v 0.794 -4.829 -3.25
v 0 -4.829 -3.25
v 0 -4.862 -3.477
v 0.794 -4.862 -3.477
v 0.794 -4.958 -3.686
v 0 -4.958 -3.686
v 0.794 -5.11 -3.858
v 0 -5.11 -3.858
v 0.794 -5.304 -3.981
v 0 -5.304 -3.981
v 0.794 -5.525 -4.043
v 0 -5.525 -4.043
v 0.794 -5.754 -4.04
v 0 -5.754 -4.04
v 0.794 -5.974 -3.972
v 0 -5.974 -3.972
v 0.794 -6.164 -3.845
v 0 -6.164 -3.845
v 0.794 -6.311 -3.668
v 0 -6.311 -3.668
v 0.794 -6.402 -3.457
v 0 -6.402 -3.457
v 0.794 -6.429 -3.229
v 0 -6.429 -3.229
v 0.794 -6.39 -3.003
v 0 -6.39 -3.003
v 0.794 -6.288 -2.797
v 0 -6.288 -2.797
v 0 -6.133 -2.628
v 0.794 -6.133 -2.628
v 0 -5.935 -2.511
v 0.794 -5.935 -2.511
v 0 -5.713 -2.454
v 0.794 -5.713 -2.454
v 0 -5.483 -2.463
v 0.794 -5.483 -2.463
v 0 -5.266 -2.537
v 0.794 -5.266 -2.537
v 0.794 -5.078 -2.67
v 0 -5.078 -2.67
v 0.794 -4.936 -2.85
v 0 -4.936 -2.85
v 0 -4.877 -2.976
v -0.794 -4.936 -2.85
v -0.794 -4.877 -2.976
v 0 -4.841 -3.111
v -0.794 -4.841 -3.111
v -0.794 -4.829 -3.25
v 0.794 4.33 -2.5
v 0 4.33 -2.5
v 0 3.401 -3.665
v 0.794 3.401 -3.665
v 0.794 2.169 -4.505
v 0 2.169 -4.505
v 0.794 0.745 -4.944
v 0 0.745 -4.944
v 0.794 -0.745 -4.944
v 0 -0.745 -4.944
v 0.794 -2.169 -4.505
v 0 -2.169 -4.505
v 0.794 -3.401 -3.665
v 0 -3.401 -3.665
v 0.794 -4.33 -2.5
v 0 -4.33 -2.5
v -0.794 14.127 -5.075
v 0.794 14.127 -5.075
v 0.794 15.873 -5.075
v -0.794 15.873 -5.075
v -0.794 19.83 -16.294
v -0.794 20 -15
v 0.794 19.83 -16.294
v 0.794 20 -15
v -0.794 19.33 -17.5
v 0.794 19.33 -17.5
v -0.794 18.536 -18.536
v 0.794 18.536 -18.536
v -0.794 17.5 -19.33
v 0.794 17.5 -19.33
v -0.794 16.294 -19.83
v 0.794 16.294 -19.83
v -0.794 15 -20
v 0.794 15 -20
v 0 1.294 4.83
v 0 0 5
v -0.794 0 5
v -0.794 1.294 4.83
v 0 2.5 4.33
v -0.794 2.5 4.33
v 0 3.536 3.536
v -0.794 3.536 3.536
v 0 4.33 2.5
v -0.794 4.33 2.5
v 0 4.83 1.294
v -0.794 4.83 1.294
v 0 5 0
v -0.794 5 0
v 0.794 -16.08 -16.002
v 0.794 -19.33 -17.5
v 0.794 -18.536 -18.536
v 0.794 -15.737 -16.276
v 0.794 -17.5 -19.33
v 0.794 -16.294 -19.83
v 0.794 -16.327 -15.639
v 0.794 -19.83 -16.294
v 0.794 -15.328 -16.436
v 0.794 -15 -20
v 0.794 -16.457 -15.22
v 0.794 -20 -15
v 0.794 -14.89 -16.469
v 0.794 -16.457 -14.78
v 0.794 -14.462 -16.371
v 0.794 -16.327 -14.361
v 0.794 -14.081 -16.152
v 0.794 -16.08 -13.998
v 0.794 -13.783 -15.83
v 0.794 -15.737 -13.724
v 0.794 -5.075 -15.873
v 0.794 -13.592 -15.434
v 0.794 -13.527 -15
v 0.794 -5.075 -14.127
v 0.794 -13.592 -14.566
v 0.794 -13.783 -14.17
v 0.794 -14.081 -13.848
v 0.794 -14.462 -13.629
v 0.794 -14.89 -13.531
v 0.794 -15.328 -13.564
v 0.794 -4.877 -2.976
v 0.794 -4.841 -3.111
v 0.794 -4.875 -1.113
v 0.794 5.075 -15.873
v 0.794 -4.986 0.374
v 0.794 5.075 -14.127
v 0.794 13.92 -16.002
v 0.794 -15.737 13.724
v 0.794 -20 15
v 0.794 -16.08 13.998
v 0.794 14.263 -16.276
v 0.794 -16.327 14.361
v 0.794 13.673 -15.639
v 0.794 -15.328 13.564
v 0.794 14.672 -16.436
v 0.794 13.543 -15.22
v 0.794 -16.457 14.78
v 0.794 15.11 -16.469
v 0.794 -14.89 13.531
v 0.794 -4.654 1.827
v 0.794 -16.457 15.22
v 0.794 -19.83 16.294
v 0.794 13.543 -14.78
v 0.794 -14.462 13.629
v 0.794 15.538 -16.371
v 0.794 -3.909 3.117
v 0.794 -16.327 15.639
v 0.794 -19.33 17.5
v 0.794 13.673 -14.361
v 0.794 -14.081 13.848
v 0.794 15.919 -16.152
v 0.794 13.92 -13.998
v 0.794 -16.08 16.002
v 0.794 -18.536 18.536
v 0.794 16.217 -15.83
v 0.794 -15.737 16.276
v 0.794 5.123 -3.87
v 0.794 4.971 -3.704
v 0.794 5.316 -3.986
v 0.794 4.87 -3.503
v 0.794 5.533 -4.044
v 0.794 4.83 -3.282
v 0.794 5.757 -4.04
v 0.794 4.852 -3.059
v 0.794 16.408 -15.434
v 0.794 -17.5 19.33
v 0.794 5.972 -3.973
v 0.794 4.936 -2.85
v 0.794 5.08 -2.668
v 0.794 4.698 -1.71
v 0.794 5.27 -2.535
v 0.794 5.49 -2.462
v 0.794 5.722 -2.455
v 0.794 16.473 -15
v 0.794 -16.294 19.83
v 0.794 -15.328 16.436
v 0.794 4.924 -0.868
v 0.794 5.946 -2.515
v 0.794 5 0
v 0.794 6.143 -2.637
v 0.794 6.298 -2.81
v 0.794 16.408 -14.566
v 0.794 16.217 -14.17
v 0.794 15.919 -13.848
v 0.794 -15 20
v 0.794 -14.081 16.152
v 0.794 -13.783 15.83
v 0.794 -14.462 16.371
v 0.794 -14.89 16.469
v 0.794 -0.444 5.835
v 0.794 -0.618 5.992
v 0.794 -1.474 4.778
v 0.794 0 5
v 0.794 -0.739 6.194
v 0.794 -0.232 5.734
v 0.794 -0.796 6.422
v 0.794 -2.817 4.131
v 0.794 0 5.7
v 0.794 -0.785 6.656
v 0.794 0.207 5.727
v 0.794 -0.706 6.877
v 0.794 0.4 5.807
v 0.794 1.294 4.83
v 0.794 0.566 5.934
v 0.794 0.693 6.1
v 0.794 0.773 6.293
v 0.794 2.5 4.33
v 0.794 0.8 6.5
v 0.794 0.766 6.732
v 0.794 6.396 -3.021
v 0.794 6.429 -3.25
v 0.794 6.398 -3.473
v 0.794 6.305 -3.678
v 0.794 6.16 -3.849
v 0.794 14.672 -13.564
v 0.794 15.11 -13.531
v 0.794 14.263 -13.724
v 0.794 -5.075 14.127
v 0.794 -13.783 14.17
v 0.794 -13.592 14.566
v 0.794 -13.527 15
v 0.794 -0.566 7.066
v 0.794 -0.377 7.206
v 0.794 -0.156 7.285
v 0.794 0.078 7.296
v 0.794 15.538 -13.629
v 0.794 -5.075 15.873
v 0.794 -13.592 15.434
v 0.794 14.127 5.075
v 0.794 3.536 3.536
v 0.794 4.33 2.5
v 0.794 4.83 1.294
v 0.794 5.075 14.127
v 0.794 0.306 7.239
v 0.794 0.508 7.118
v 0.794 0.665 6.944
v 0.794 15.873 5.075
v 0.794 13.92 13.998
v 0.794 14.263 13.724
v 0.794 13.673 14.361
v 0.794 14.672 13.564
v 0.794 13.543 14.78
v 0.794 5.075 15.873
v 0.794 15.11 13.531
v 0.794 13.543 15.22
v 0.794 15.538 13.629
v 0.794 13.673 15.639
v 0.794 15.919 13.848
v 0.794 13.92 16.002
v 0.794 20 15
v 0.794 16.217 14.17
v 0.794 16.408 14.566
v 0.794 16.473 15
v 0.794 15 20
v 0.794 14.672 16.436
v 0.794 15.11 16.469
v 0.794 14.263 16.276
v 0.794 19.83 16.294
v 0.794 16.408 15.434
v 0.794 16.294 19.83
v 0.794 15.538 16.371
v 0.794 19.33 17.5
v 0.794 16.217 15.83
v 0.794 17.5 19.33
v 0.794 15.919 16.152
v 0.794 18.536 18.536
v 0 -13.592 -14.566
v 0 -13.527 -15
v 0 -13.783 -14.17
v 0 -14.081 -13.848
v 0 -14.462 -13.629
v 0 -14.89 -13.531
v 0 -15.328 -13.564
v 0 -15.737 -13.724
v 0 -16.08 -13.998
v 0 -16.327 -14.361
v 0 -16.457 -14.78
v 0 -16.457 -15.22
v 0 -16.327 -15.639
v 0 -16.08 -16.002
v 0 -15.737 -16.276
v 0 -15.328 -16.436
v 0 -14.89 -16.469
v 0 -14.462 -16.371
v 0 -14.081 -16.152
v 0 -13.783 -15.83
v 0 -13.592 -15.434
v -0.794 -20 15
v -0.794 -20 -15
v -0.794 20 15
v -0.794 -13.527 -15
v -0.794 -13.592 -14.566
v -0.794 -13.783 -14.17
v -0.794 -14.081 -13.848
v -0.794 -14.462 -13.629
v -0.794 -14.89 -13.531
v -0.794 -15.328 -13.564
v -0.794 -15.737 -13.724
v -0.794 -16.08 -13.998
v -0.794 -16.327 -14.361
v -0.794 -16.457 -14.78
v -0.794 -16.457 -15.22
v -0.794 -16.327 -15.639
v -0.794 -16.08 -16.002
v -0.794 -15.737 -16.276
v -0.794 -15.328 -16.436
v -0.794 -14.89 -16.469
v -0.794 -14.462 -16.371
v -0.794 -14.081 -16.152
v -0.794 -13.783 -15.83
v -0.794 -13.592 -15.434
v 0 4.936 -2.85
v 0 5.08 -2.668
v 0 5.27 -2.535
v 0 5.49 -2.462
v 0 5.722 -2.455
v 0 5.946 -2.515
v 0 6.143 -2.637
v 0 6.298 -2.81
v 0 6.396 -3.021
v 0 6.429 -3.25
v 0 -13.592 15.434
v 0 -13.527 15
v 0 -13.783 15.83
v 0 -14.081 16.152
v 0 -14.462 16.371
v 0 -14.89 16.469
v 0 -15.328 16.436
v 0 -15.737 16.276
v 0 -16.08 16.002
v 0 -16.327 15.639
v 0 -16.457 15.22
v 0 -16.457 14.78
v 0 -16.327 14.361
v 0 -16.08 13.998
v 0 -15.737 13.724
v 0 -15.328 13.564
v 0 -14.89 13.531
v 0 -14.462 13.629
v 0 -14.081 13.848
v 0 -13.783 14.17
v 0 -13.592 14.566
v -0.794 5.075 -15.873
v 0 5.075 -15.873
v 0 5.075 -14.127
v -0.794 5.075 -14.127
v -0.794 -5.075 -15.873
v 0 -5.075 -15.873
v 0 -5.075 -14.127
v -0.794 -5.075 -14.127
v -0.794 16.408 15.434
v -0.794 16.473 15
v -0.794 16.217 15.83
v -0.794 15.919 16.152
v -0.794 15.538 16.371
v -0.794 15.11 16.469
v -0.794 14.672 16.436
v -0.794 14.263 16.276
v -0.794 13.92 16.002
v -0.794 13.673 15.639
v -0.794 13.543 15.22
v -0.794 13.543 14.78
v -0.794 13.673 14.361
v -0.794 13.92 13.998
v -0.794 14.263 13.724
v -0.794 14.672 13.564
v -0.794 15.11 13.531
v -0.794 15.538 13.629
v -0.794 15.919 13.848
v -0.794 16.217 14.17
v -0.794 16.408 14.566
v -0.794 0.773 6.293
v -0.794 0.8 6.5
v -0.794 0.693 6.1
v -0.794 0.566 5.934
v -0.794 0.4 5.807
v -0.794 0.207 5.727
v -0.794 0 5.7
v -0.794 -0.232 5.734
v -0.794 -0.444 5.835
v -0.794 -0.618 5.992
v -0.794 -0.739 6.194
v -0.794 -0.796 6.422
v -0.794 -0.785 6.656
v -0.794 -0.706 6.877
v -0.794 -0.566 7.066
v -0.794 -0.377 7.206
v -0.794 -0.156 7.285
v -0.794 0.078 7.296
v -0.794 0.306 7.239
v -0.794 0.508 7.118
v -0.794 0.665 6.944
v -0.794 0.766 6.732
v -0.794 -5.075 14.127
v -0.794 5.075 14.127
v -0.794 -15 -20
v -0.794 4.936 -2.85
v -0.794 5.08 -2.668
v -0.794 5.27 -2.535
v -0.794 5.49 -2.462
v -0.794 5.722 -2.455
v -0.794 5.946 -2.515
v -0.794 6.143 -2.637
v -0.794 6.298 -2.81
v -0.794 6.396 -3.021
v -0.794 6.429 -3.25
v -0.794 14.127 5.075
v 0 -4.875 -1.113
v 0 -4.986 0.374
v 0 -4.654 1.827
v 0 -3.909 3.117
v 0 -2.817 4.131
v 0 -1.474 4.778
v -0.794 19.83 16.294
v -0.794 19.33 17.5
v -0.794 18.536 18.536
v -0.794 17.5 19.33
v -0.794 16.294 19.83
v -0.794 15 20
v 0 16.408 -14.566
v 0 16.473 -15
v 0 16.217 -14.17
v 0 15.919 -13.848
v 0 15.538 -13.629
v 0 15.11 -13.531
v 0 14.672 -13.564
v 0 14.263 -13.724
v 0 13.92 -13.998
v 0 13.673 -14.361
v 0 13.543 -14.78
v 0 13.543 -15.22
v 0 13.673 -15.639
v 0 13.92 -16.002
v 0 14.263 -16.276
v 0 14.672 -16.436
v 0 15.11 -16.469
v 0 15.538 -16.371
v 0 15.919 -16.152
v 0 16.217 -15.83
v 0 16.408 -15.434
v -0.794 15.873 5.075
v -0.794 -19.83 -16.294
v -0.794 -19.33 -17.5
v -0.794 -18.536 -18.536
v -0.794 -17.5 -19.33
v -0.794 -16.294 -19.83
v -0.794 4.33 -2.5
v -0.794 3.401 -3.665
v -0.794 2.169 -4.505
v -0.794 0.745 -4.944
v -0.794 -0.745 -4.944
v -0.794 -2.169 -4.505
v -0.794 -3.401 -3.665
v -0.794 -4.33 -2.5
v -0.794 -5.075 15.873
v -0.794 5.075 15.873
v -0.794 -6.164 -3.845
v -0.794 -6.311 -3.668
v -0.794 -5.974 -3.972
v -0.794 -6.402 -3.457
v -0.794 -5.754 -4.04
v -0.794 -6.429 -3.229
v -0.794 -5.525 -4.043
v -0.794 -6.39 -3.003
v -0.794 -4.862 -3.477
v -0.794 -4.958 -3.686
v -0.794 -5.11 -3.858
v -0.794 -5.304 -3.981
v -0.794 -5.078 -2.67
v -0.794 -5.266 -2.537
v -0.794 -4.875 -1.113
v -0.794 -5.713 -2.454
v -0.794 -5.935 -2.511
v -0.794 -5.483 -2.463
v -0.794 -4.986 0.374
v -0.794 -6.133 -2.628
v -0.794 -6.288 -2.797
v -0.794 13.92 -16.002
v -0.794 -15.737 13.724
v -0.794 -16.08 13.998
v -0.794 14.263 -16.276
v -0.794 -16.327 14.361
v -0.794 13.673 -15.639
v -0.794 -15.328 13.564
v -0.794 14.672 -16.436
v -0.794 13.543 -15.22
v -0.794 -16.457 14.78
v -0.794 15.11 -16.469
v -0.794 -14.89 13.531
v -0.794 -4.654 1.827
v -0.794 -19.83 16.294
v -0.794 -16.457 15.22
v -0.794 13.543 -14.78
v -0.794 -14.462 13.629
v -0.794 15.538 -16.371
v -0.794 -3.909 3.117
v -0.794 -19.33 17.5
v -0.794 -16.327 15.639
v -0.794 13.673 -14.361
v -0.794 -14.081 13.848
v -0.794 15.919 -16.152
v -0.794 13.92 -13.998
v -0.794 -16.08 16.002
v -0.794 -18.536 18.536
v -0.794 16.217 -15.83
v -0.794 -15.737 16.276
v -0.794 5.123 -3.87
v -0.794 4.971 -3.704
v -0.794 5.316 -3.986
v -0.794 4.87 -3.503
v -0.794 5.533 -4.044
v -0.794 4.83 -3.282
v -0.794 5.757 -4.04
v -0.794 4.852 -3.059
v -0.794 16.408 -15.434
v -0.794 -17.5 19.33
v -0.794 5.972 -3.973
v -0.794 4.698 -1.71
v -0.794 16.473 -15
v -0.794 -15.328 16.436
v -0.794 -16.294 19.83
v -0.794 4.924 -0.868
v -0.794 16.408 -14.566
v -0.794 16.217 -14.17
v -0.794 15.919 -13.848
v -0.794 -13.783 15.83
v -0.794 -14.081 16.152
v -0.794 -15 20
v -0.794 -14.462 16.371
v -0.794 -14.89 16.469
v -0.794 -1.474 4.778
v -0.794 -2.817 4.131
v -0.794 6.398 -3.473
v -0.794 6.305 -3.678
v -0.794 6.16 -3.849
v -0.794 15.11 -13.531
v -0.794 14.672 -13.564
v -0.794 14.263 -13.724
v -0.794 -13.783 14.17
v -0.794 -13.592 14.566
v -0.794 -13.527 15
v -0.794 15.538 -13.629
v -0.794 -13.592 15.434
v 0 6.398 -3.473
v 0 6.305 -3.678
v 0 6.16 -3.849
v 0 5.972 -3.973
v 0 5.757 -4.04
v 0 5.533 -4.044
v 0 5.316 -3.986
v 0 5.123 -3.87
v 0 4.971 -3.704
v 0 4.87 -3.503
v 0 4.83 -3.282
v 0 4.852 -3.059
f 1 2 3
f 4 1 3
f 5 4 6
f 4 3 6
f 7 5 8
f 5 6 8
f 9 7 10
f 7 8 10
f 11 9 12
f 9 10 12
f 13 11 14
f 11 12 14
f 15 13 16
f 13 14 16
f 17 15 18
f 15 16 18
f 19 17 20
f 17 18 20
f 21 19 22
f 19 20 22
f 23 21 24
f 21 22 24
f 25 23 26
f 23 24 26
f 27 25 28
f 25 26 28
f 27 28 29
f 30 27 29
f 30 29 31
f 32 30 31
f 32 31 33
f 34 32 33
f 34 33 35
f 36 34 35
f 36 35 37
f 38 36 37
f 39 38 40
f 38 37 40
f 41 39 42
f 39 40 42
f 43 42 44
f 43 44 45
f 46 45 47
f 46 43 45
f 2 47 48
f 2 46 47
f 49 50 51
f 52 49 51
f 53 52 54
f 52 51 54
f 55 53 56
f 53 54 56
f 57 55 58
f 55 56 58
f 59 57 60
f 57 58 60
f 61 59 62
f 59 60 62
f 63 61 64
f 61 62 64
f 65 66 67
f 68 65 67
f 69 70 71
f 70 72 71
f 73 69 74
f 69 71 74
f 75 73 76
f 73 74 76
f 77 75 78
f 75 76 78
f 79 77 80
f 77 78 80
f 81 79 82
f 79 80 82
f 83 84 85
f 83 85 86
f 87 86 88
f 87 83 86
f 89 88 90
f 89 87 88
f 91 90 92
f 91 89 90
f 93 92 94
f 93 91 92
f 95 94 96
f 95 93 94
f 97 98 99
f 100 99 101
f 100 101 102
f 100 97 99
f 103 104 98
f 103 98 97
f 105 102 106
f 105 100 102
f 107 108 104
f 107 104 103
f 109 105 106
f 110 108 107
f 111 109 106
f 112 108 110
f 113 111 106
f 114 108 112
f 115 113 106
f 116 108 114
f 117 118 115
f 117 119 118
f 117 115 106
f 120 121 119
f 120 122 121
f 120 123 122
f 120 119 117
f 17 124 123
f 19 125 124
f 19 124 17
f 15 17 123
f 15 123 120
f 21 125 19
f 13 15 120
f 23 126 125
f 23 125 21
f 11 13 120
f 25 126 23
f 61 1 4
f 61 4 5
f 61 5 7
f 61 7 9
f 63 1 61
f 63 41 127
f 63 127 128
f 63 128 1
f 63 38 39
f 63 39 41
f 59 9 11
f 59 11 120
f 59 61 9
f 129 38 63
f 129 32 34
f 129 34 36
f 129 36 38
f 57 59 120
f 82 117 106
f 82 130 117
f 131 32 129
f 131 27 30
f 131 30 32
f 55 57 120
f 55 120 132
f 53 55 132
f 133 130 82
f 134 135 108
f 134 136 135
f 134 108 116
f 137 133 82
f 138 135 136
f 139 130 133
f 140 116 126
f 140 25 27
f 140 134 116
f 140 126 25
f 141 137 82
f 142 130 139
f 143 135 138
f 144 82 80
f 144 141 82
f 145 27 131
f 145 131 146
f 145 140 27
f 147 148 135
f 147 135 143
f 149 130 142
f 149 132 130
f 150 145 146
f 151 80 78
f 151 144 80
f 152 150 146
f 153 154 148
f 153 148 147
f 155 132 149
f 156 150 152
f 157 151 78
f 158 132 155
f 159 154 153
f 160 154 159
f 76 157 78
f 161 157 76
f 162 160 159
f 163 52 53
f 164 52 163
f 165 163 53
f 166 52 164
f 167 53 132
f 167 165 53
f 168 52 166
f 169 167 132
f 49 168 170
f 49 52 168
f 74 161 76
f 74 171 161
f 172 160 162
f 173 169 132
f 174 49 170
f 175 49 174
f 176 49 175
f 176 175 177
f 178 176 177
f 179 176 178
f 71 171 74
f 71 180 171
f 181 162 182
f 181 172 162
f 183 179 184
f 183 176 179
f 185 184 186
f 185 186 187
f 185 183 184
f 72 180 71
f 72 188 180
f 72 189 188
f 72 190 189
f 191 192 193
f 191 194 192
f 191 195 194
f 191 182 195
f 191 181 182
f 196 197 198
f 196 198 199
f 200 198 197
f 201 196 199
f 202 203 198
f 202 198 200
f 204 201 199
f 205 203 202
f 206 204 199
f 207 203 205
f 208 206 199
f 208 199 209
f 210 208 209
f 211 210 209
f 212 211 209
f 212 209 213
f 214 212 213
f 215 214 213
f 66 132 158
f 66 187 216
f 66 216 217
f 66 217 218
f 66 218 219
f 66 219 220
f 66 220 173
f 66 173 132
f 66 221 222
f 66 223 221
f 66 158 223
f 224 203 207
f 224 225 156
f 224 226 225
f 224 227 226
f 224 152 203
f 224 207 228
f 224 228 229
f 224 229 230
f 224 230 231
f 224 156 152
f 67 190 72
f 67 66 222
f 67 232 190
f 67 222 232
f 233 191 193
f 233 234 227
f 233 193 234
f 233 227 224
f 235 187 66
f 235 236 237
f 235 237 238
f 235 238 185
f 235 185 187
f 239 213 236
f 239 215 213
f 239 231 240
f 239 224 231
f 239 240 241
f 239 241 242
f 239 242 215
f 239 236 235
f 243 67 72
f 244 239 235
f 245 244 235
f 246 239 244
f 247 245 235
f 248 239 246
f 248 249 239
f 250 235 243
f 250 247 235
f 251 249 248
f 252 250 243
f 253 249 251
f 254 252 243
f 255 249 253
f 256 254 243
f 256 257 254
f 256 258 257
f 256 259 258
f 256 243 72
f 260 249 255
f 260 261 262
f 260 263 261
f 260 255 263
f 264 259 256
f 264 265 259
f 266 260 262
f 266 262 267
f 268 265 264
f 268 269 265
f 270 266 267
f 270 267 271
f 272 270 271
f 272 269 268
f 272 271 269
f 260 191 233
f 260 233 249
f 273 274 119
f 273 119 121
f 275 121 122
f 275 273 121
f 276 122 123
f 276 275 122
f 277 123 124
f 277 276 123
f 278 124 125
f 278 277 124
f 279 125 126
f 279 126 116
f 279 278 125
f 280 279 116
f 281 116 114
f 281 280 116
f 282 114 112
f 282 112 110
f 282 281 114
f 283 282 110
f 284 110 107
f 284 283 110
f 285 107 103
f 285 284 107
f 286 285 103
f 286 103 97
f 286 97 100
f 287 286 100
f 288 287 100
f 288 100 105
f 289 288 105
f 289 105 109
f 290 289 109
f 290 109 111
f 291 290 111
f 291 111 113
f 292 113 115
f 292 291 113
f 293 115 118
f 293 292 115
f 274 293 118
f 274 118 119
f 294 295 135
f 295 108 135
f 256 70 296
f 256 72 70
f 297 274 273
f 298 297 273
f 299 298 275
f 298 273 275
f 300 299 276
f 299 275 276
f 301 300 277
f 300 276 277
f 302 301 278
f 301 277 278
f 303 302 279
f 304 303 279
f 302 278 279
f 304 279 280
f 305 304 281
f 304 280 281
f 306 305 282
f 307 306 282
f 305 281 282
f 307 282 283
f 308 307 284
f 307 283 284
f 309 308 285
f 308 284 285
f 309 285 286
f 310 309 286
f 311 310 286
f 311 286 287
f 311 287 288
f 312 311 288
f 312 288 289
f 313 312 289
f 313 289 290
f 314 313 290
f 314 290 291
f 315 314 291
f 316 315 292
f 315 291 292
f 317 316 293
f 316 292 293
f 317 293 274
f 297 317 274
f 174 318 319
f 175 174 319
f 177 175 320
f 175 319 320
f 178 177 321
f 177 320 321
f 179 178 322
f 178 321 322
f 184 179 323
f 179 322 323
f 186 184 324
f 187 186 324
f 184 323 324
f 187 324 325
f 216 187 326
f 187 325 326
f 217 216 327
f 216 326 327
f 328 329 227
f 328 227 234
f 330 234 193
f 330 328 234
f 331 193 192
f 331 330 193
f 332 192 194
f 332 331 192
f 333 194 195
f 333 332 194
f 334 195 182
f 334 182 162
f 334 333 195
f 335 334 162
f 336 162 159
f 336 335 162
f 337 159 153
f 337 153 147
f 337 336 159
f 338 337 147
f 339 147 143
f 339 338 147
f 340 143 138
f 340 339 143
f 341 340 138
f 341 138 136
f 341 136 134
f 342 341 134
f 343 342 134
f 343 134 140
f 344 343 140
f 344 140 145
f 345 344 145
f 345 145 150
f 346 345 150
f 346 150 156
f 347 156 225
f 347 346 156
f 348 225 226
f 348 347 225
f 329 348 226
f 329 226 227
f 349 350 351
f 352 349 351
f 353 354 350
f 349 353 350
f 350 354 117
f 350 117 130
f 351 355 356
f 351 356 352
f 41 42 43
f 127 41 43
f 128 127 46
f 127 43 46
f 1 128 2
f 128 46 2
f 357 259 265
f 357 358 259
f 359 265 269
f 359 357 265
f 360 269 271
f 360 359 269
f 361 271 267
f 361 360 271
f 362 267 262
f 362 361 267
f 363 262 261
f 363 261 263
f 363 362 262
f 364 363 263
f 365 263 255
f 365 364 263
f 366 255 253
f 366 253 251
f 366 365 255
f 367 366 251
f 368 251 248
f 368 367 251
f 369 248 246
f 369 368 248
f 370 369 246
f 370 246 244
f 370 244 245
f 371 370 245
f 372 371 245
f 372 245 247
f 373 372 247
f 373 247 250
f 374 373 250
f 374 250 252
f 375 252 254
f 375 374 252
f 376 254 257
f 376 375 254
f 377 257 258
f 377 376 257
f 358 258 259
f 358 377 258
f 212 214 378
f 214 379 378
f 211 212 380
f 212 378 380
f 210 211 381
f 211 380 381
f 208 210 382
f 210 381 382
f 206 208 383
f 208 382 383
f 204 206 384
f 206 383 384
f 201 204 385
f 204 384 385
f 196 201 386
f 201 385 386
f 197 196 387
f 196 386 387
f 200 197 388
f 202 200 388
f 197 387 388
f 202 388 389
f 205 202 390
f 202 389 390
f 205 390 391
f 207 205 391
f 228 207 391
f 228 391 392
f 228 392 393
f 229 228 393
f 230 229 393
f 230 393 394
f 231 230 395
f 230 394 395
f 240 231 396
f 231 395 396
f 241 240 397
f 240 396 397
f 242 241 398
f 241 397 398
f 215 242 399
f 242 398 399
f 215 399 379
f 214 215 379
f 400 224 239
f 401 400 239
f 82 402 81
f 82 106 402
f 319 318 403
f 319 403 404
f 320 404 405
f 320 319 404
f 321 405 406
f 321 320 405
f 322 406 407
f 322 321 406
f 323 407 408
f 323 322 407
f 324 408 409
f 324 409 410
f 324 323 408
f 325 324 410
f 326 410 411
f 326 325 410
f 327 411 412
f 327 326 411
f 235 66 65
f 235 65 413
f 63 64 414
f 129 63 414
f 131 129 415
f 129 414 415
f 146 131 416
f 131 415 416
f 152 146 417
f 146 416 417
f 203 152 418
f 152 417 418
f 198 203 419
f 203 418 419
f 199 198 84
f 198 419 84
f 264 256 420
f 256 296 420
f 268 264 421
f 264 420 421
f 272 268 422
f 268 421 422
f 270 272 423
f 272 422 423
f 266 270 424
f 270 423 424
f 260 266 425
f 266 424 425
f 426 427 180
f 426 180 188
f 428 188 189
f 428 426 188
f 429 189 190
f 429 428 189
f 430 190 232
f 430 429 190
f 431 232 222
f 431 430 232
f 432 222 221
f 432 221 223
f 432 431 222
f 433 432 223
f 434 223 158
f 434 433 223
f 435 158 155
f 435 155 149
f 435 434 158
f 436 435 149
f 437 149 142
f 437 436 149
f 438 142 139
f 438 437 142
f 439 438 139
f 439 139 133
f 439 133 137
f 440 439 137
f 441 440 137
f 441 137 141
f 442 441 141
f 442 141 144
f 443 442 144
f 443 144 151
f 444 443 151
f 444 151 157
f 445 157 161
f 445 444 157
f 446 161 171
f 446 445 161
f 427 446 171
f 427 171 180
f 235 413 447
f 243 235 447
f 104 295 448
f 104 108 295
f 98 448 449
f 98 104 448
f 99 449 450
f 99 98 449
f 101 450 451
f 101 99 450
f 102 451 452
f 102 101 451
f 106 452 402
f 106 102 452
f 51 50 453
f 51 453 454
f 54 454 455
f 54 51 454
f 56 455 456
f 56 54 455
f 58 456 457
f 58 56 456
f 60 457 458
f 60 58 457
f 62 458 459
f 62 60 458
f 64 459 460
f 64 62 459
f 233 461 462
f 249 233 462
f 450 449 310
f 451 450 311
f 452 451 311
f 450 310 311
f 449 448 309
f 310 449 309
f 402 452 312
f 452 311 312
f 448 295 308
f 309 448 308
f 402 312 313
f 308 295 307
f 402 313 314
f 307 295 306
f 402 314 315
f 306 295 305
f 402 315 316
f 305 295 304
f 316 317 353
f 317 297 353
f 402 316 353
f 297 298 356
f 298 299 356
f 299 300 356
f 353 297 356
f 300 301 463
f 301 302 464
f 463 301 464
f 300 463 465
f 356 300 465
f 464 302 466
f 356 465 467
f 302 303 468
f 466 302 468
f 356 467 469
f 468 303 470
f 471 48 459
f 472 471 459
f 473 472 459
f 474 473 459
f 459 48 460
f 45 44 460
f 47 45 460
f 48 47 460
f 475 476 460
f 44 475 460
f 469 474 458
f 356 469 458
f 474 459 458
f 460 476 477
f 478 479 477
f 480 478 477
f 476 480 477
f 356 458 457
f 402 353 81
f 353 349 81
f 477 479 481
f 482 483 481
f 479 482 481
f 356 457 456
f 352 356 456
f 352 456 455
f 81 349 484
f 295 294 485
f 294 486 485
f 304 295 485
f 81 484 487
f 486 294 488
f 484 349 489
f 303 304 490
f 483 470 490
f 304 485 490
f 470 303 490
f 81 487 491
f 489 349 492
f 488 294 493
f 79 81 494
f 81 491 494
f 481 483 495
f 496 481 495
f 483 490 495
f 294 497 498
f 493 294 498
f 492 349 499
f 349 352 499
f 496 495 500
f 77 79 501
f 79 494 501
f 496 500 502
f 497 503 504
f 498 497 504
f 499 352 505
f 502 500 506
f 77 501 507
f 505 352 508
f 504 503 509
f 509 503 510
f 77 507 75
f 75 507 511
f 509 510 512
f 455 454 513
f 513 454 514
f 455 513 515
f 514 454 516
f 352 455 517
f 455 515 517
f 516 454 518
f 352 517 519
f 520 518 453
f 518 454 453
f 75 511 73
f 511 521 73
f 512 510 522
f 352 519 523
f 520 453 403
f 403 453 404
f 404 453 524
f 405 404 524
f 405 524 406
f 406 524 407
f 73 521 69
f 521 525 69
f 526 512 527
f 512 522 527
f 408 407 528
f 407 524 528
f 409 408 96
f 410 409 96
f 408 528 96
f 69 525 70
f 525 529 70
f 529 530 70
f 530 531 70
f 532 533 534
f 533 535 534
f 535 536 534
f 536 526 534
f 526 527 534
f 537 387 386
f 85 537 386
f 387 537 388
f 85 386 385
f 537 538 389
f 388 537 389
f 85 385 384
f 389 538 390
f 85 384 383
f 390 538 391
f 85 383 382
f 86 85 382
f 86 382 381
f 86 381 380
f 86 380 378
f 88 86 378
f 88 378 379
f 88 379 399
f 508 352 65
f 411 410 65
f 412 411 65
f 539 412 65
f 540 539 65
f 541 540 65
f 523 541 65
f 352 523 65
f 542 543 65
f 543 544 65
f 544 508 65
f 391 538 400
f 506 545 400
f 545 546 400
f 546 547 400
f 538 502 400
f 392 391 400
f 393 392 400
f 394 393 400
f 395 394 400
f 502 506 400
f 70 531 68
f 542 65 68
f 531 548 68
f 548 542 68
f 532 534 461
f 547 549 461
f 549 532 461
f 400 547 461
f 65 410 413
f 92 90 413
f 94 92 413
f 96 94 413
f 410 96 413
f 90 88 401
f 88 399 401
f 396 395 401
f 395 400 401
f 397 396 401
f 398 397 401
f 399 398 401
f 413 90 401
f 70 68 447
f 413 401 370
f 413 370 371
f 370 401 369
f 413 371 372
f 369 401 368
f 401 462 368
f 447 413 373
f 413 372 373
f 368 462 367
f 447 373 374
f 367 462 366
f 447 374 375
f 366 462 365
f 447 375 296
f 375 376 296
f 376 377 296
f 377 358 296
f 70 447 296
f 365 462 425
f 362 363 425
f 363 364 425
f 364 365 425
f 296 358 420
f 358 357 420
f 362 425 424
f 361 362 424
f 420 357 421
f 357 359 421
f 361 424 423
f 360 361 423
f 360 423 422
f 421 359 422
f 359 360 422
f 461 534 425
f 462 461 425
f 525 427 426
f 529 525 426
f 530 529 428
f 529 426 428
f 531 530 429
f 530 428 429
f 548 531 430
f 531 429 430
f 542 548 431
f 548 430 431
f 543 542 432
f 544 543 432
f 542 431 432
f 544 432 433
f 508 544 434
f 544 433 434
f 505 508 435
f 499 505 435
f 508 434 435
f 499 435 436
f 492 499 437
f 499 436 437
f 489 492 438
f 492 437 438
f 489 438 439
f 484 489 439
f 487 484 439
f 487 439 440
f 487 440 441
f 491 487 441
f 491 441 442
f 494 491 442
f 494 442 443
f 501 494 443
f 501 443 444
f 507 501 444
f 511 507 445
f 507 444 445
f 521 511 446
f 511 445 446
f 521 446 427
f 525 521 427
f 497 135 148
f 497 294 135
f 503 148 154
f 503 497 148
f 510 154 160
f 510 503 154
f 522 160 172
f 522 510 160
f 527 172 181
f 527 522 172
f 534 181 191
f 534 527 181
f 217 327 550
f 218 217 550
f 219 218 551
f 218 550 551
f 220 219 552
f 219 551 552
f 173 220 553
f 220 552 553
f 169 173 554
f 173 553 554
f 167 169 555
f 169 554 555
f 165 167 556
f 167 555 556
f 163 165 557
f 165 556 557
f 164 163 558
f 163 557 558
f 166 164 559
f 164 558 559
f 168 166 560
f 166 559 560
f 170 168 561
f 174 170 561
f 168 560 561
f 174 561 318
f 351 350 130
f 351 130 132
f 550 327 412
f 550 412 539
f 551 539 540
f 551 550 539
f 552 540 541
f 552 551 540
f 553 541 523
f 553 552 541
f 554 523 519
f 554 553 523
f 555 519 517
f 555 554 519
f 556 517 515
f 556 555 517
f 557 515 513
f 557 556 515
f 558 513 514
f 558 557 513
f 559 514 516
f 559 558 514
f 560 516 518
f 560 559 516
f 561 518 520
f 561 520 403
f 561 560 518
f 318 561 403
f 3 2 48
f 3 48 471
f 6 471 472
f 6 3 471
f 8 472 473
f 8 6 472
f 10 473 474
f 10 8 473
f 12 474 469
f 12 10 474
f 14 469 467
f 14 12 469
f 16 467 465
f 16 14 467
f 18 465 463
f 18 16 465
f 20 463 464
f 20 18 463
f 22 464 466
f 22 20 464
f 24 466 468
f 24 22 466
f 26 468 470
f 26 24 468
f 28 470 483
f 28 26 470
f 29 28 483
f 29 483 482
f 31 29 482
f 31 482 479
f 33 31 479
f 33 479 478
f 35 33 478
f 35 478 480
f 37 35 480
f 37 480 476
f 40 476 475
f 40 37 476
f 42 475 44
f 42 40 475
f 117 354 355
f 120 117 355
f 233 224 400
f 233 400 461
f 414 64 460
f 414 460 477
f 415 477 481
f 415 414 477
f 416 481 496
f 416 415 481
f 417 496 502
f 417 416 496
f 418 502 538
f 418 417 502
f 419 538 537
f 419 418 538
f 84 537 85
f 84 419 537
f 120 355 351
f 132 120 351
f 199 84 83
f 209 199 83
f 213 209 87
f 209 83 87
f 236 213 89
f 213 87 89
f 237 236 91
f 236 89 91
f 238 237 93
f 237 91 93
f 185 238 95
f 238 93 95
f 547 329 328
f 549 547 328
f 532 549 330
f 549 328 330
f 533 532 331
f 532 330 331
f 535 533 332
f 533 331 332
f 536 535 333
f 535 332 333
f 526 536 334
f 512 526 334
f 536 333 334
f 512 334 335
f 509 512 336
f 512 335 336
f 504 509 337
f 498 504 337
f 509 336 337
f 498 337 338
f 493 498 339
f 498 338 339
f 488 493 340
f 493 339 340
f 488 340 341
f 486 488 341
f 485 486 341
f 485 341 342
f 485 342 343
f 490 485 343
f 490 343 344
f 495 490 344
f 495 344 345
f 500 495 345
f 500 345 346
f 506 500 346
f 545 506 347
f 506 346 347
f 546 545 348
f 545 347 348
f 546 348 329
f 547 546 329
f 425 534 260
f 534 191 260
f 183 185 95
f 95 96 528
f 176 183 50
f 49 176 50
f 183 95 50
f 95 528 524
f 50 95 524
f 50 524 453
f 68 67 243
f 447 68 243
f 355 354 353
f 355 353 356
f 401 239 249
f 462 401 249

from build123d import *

# Parameters (mm, degrees)
F0_W     = 40
F0_H     = 40
F0_R     = 1.4732
F0_W_2   = 10.15
F0_H_2   = 1.74625
F0_W_3   = 1.74625
F0_H_3   = 10.15
F1_DEPTH = 0.79375
F2_R     = 5


# Not quite as in the source:
# - a length typed as a fraction of an inch, garbled in the dataset ("3 / 203.2 mm" for 3/8 in), is restored


with BuildPart() as f1:
    # F0 (on Right) → F1 (new body, symmetric)
    with BuildSketch(Plane.YZ):
        Rectangle(F0_W, F0_H)
        with Locations((-15, -15)):
            Circle(F0_R, mode=Mode.SUBTRACT)
        with BuildLine():
            ThreePointArc((-4.8291651246, -3.25), (-6.4019057856, -3.4570552361), (-4.9363448016, -2.85))
            ThreePointArc((-4.9363448016, -2.85), (-4.8564244636, -3.0429447639), (-4.8291651246, -3.25))
        make_face(mode=Mode.SUBTRACT)
        with Locations((0, -15)):
            Rectangle(F0_W_2, F0_H_2, mode=Mode.SUBTRACT)
        with Locations((15, -15)):
            Circle(F0_R, mode=Mode.SUBTRACT)
        with BuildLine():
            ThreePointArc((6.4291651246, -3.25), (5.4221098885, -4.022740661), (4.9363448016, -2.85))
            ThreePointArc((4.9363448016, -2.85), (5.8362203607, -2.477259339), (6.4291651246, -3.25))
        make_face(mode=Mode.SUBTRACT)
        with Locations((-15, 15)):
            Circle(F0_R, mode=Mode.SUBTRACT)
        with BuildLine():
            ThreePointArc((0, 5), (3.5355339059, 3.5355339059), (5, 0))
            ThreePointArc((5, 0), (4.8296291314, -1.2940952255), (4.3301270189, -2.5))
            ThreePointArc((4.3301270189, -2.5), (0, -5), (-4.3301270189, -2.5))
            ThreePointArc((-4.3301270189, -2.5), (-4.3301270189, 2.5), (0, 5))
        make_face(mode=Mode.SUBTRACT)
        with BuildLine():
            ThreePointArc((0.8, 6.5), (0.5656854249, 5.9343145751), (0, 5.7))
            ThreePointArc((0, 5.7), (-0.5656854249, 7.0656854249), (0.8, 6.5))
        make_face(mode=Mode.SUBTRACT)
        with Locations((15, 0)):
            Rectangle(F0_W_3, F0_H_3, mode=Mode.SUBTRACT)
        with Locations((0, 15)):
            Rectangle(F0_W_2, F0_H_2, mode=Mode.SUBTRACT)
        with Locations((15, 15)):
            Circle(F0_R, mode=Mode.SUBTRACT)
    extrude(amount=F1_DEPTH, both=True)

    # F2
    f2_edges = [f1.edges().sort_by_distance(p)[0] for p in [
        (0, -20, 20),
        (0, 20, 20),
        (0, -20, -20),
        (0, 20, -20),
    ]]
    fillet(f2_edges, radius=F2_R)


solid = f1.part
